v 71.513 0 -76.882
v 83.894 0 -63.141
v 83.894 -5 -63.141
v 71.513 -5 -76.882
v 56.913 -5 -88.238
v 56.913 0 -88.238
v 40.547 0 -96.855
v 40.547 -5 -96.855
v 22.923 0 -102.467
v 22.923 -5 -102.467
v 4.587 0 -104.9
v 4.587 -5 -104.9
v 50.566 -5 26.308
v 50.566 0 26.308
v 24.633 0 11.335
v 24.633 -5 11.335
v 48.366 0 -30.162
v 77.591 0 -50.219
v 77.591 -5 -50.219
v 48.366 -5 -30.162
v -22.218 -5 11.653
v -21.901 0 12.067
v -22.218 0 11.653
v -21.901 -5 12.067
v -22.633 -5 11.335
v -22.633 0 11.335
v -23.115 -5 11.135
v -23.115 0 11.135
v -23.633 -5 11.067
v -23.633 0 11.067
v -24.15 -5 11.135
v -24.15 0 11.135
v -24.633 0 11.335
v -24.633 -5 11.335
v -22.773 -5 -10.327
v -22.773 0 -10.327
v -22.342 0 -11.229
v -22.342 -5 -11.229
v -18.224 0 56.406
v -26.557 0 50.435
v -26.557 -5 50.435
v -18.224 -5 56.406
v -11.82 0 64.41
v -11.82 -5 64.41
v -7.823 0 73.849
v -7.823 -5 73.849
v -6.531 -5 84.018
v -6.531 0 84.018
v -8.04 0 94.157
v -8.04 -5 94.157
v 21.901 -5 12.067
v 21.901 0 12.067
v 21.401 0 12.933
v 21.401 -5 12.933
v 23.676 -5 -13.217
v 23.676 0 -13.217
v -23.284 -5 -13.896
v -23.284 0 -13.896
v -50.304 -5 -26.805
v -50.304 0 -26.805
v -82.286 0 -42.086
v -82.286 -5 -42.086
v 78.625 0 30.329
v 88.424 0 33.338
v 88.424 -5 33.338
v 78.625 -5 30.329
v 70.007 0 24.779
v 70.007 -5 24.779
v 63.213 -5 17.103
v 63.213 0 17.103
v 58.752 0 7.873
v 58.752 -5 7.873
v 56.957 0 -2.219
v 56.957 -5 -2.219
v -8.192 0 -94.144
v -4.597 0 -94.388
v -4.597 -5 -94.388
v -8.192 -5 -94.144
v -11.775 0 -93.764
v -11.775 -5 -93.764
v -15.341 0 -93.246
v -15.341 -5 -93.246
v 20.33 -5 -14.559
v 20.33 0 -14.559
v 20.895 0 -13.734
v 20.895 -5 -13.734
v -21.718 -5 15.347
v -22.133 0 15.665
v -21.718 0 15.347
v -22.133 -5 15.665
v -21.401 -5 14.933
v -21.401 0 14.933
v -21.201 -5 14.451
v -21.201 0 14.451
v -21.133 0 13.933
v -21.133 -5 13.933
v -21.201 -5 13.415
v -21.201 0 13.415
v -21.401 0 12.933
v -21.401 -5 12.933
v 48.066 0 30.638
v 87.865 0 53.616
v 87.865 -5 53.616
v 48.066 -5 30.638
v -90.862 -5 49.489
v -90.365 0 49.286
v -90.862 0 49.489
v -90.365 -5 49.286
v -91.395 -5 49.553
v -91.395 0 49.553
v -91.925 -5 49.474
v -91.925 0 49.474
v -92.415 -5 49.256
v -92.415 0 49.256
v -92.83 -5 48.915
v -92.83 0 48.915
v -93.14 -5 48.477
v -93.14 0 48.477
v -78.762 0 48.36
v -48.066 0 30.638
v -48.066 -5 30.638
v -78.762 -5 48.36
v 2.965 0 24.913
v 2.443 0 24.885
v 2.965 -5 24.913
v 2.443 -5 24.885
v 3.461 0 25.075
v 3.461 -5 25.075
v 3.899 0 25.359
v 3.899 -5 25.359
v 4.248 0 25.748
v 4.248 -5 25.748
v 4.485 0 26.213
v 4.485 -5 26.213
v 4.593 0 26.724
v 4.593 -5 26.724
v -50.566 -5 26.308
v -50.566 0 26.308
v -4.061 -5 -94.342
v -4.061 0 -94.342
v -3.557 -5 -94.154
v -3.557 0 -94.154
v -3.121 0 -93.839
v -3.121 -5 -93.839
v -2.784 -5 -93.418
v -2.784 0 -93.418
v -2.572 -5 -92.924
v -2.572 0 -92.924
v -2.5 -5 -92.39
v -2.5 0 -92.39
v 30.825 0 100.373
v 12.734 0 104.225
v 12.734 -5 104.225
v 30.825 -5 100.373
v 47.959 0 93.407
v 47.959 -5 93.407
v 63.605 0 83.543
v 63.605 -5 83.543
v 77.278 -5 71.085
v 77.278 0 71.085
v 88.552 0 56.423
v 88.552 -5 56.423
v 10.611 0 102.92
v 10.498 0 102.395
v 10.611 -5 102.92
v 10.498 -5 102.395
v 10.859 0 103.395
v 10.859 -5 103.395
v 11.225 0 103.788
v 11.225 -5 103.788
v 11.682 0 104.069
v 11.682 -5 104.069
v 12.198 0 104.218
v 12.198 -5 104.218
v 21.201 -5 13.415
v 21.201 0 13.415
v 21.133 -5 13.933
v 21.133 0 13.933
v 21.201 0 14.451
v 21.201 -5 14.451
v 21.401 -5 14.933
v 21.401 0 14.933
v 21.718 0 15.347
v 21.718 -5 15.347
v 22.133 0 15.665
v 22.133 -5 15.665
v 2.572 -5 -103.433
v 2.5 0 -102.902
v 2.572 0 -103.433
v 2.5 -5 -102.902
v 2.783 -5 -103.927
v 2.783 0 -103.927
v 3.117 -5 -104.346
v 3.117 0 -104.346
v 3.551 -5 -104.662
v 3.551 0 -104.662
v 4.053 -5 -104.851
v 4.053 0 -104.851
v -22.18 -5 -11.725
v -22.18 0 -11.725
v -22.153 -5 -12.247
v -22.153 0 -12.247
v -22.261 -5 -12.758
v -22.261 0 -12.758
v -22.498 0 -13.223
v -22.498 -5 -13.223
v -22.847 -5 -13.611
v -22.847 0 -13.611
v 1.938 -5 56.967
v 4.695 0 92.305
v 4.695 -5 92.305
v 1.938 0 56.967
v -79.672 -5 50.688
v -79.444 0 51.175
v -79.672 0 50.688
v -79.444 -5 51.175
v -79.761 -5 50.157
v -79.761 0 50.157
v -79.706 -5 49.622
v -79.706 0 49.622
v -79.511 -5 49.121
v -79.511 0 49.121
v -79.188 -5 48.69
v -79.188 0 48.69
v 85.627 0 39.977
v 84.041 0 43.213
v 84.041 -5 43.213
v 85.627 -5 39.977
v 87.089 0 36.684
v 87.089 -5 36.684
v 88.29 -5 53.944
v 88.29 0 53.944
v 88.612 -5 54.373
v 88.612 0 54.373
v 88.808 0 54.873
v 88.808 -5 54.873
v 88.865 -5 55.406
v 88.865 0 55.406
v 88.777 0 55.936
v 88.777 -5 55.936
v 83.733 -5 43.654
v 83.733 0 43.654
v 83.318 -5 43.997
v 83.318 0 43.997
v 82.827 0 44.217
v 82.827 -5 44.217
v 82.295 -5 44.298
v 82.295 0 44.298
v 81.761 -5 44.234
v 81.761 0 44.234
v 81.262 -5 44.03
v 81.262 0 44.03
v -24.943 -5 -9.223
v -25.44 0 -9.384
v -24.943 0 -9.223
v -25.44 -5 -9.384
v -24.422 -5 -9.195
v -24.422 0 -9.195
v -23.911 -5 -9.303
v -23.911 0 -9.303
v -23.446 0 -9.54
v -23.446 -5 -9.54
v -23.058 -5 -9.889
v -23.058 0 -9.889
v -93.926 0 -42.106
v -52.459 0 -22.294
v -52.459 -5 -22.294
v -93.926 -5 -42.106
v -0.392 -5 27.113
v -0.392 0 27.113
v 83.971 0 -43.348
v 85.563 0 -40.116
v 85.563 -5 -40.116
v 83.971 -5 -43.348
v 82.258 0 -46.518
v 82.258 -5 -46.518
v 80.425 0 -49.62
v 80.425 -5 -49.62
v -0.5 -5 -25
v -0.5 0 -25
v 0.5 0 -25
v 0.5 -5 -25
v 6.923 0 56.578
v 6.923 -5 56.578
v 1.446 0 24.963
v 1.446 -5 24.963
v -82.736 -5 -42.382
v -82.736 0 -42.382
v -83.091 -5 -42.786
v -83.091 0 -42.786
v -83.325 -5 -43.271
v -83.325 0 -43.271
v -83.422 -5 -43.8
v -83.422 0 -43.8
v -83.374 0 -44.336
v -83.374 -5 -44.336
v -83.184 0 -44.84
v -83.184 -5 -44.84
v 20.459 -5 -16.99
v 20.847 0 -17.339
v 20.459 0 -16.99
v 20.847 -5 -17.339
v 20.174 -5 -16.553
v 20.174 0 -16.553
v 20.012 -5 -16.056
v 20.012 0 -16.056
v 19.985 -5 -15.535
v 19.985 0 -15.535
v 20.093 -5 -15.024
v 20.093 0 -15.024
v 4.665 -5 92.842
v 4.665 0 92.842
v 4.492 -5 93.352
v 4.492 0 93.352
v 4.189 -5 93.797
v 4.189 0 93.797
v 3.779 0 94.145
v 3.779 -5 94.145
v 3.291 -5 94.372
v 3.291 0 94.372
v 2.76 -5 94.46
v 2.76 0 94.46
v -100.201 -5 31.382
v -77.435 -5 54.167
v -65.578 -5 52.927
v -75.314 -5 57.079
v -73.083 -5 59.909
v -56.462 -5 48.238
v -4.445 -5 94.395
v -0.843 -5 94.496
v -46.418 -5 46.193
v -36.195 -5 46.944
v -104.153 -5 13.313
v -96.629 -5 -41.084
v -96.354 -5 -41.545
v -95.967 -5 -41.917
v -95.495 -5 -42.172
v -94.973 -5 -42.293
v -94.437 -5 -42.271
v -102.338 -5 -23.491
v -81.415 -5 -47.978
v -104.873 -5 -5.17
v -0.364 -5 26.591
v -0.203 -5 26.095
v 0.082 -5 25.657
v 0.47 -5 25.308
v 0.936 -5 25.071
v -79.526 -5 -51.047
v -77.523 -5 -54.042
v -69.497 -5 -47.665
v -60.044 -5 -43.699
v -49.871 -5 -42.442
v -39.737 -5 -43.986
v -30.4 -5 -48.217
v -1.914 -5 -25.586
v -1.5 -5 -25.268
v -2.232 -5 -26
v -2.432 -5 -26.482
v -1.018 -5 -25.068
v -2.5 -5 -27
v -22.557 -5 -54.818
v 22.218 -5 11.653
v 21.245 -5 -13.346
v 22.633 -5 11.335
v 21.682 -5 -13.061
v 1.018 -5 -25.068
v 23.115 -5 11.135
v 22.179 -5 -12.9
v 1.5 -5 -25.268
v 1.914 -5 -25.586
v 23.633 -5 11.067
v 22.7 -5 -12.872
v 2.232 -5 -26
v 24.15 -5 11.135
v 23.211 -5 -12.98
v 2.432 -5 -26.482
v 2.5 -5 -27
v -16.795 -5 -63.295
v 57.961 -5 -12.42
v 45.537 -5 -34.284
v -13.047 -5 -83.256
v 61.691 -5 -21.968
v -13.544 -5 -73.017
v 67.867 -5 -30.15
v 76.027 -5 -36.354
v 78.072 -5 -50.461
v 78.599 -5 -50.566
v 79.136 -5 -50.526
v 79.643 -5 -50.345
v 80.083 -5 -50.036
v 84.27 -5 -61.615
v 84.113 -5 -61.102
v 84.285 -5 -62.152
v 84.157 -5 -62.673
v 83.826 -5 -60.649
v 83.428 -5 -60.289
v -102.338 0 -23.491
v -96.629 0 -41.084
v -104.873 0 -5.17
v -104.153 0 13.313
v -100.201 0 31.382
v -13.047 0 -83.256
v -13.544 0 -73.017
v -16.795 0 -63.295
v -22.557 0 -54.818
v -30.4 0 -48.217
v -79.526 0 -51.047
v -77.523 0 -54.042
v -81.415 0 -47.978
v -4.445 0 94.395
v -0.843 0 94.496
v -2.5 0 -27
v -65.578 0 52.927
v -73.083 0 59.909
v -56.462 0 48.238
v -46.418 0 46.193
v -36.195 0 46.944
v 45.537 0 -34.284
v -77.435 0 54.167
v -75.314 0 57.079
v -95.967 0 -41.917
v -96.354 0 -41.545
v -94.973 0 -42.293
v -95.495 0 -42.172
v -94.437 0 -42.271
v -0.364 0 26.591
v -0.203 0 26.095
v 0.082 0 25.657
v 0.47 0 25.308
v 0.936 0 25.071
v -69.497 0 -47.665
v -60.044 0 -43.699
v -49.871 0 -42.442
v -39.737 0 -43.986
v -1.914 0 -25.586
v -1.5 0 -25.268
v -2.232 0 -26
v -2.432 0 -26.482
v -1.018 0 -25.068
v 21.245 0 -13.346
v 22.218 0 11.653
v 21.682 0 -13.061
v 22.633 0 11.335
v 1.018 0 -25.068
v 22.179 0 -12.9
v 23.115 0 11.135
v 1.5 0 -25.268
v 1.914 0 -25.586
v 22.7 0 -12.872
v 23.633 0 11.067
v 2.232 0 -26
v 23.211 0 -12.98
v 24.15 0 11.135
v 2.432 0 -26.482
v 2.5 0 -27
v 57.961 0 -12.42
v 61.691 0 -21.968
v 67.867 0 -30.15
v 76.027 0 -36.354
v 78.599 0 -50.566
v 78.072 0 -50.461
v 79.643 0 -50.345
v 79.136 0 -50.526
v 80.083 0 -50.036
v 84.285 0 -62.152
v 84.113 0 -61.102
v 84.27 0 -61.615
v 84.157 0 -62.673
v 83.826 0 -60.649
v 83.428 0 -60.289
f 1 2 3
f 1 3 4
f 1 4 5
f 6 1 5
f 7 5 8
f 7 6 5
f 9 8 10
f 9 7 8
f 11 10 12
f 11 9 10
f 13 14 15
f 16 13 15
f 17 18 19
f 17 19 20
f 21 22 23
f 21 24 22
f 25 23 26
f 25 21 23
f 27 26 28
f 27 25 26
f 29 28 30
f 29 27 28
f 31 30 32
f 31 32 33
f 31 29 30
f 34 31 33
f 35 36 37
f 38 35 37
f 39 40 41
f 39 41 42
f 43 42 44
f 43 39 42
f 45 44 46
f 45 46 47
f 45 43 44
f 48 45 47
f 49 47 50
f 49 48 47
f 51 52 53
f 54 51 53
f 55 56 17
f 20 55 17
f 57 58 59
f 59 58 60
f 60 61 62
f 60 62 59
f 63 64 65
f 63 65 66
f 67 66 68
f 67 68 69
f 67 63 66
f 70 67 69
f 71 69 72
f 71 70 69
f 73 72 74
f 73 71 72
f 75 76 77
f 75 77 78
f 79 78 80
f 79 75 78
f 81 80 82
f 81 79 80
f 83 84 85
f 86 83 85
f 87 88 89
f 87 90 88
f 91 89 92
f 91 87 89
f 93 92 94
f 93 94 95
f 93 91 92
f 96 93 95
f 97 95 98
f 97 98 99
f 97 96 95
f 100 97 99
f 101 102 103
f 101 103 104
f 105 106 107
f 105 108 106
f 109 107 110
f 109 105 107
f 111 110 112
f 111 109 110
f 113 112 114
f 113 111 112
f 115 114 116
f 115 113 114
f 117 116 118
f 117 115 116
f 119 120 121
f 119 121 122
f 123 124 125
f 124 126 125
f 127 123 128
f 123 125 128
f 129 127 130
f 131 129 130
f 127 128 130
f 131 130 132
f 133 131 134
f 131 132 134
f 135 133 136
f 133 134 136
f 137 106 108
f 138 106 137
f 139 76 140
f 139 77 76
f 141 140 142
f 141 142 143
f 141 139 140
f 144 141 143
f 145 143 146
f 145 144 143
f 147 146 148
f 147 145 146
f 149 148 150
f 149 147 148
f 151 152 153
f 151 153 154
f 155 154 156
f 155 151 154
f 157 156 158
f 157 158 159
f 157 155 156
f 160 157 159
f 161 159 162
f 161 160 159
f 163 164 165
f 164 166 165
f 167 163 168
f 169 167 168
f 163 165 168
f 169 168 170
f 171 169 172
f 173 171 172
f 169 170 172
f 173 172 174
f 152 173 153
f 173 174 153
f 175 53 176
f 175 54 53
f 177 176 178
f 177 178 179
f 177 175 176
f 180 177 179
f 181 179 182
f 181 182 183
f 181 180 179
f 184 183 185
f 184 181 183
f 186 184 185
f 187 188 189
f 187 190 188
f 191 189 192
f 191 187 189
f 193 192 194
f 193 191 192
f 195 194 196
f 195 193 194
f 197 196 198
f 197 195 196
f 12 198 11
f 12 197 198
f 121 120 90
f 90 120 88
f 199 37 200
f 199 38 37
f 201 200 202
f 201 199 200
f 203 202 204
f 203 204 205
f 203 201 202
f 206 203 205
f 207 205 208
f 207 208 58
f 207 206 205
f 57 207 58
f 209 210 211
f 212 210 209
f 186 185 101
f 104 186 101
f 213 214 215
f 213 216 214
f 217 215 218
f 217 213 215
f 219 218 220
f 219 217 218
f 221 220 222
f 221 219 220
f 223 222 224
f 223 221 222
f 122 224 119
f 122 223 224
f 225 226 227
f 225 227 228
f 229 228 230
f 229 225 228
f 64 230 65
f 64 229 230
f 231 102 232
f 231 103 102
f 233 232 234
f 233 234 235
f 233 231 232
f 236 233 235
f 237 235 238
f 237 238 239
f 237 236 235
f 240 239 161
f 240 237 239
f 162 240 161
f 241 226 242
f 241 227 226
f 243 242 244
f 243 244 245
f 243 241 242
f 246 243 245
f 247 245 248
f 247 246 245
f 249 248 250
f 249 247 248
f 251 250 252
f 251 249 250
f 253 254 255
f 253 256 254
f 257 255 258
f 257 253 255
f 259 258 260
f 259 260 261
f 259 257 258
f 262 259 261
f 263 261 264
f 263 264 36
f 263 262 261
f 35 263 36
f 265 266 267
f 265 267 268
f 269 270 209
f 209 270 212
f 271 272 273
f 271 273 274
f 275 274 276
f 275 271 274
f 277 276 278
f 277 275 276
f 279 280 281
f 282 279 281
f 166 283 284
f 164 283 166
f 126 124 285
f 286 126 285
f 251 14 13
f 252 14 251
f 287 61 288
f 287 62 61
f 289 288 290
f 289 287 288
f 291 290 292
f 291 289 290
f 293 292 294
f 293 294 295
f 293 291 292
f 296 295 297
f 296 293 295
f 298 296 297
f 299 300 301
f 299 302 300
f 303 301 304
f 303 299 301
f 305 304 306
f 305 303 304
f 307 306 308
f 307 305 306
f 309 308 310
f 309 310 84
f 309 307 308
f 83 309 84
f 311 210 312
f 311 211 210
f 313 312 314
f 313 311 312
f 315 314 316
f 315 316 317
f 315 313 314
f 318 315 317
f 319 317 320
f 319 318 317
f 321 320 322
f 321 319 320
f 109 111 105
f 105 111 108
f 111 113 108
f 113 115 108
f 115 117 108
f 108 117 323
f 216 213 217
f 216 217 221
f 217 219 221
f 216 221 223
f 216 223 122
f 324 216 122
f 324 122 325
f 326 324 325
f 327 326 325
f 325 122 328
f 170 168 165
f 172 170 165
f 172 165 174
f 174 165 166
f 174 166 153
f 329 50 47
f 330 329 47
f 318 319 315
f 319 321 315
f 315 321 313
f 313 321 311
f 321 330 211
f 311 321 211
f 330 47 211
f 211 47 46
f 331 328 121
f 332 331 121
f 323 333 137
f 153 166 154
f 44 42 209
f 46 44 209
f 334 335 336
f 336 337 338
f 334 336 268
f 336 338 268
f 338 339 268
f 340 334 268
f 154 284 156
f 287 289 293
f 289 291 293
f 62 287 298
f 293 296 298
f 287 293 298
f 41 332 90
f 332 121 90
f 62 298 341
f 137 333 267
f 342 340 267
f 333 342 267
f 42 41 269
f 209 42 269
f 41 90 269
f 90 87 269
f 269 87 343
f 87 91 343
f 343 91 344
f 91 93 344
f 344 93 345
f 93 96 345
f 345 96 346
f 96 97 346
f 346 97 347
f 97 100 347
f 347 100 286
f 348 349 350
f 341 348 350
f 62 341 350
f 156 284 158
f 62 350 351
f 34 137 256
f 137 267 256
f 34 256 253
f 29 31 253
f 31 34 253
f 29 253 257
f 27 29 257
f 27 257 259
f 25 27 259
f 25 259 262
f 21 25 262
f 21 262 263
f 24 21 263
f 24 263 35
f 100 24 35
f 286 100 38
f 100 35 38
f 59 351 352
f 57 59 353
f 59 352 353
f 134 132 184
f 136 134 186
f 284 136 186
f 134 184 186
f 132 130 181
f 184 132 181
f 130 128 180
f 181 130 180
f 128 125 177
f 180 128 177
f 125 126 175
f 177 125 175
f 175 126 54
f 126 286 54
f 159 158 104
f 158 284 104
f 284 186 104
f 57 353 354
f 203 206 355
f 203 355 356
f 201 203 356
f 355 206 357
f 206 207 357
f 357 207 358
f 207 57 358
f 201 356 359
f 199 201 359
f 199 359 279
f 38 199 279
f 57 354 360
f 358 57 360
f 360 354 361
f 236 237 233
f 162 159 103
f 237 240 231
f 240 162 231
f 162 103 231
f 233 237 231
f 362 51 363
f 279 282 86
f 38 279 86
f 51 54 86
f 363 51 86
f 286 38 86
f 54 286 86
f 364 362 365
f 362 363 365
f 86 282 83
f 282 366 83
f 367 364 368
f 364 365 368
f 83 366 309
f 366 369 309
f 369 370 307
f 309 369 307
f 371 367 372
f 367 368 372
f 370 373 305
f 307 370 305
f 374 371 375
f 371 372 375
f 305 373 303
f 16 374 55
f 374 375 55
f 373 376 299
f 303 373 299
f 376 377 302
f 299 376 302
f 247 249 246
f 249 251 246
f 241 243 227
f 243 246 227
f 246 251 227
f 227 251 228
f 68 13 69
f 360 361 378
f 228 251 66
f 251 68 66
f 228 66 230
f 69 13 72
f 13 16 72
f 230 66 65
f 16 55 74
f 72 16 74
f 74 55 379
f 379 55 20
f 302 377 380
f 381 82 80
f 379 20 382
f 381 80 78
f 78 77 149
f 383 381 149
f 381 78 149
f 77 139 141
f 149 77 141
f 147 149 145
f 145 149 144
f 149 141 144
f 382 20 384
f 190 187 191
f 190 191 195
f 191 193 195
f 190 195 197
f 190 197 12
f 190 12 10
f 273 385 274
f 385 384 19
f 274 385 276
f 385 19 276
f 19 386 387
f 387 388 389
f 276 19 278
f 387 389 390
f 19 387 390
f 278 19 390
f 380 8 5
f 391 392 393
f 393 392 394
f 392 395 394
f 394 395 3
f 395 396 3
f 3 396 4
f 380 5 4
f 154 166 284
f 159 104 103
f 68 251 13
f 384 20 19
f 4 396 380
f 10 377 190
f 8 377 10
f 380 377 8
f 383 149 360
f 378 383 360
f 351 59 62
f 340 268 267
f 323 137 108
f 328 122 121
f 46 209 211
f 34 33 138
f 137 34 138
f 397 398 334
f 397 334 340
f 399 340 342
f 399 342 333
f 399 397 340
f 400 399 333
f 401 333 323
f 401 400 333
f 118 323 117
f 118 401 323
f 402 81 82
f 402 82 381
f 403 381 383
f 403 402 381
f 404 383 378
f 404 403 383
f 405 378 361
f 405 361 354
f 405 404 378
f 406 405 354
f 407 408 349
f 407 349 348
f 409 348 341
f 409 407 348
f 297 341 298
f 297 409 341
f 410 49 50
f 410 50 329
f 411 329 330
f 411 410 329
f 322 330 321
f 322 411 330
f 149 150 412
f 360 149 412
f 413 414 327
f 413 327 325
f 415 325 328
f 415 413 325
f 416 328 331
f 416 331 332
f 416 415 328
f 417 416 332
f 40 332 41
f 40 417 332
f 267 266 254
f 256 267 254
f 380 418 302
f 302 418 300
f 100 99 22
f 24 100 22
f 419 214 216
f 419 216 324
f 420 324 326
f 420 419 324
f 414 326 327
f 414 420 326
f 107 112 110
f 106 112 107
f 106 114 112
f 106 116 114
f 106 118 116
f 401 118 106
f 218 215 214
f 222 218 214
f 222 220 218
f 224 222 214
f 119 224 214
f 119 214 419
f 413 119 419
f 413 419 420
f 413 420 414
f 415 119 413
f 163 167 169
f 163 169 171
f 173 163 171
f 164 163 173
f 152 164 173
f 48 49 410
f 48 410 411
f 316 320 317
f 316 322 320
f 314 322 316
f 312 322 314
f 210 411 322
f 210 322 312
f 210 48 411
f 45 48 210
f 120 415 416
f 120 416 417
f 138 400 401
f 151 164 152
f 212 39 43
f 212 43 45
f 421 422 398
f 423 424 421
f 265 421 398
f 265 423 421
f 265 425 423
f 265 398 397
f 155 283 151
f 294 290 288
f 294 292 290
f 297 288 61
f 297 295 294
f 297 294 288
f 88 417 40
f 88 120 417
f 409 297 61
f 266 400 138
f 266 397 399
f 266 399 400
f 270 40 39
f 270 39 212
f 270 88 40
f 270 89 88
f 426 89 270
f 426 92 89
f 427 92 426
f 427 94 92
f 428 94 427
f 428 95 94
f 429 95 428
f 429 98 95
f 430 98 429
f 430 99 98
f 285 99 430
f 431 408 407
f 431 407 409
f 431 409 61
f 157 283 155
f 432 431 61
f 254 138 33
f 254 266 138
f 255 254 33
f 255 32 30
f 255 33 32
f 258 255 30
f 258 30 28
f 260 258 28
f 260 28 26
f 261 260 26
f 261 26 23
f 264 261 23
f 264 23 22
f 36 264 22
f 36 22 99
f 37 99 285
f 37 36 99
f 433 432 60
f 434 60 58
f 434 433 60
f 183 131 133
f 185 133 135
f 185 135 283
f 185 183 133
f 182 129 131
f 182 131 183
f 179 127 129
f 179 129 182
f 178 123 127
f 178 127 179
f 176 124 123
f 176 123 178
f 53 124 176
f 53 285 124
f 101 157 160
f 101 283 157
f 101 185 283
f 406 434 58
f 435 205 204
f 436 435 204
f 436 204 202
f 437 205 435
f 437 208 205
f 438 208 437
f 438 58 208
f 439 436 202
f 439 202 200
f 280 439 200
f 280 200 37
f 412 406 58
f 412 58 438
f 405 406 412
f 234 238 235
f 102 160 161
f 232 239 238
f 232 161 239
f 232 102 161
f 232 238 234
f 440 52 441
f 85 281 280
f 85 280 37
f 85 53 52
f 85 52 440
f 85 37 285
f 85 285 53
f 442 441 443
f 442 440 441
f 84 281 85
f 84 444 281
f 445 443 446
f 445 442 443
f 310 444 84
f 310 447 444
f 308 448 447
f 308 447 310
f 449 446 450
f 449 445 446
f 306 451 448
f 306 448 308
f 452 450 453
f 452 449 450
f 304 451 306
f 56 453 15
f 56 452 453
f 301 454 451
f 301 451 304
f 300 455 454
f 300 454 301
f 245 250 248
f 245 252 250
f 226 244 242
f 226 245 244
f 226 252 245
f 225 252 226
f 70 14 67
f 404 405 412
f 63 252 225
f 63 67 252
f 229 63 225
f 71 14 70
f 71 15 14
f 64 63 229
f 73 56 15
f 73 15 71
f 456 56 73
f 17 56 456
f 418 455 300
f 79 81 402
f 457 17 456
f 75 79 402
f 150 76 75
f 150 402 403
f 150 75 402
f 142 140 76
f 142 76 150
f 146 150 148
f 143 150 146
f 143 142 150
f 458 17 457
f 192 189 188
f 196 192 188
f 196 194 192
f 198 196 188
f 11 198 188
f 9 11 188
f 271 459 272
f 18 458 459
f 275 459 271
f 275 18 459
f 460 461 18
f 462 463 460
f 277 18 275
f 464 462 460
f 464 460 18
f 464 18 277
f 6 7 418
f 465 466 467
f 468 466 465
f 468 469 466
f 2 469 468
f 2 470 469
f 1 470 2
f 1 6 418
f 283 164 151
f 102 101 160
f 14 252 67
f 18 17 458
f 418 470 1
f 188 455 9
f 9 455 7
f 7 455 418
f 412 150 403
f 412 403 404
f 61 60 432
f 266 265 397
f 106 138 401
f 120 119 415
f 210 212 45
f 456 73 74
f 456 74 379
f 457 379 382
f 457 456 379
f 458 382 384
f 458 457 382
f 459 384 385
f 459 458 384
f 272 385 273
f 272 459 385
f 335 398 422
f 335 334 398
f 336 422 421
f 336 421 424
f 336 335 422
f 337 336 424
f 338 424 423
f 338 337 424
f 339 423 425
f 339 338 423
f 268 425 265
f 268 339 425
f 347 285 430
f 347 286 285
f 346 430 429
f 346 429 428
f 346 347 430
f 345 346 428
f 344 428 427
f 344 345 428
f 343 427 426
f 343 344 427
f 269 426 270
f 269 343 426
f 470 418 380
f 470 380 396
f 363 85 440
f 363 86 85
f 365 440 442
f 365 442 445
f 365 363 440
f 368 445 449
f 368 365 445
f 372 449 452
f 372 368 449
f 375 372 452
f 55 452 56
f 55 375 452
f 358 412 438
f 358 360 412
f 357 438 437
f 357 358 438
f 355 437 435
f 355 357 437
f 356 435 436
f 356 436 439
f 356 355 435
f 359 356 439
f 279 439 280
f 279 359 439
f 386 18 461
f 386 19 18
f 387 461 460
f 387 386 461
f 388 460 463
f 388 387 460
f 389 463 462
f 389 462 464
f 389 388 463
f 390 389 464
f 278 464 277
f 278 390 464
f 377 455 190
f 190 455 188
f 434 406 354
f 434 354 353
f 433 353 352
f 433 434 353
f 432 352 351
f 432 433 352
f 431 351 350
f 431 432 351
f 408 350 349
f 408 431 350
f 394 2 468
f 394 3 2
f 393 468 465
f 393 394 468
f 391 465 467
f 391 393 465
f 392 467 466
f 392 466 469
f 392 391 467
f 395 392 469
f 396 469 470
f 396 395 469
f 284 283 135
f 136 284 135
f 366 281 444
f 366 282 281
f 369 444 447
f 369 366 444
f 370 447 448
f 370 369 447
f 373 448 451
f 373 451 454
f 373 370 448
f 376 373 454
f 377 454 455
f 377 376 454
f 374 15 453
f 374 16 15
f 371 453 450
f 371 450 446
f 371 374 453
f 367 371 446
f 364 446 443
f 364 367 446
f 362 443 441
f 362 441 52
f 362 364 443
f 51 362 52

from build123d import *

# Parameters (mm, degrees)
EXTRUDE_1_DEPTH = 5
EXTRUDE_2_DEPTH = 5
FILLET_1_R      = 2


with BuildPart() as part:
    # 草圖1 → 填料-伸長1 (new body)
    with BuildSketch(Plane(origin=(0, 0, 0), x_dir=(1, 0, 0), z_dir=(0, 1, 0))):
        with BuildLine():
            Line((50.565945697, -26.307511014), (22.900635095, -10.334936491))
            Line((22.900635095, -10.334936491), (20.400635095, -14.665063509))
            Line((20.400635095, -14.665063509), (48.065945697, -30.637638033))
            ThreePointArc((48.065945697, -30.637638033), (30.4, -48.216594654), (6.922542226, -56.578073572))
            Line((6.922542226, -56.578073572), (4.437329437, -24.729741355))
            Line((4.437329437, -24.729741355), (-0.547516958, -25.118722602))
            Line((-0.547516958, -25.118722602), (1.93769583, -56.96705482))
            ThreePointArc((1.93769583, -56.96705482), (-26.556795854, -50.435469602), (-48.065945697, -30.637638033))
            Line((-48.065945697, -30.637638033), (-20.400635095, -14.665063509))
            Line((-20.400635095, -14.665063509), (-22.900635095, -10.334936491))
            Line((-22.900635095, -10.334936491), (-50.565945697, -26.307511014))
            ThreePointArc((-50.565945697, -26.307511014), (-56.956795854, -2.218874948), (-52.459320124, 22.29393936))
            Line((-52.459320124, 22.29393936), (-23.635248961, 8.522030659))
            Line((-23.635248961, 8.522030659), (-21.479693405, 13.033524896))
            Line((-21.479693405, 13.033524896), (-50.303764568, 26.805433596))
            ThreePointArc((-50.303764568, 26.805433596), (-30.4, 48.216594654), (-2.5, 56.945149047))
            Line((-2.5, 56.945149047), (-2.5, 25))
            Line((-2.5, 25), (2.5, 25))
            Line((2.5, 25), (2.5, 56.945149047))
            ThreePointArc((2.5, 56.945149047), (26.556795854, 50.435469602), (45.536777898, 34.284134212))
            Line((45.536777898, 34.284134212), (19.197919523, 16.207710695))
            Line((19.197919523, 16.207710695), (22.027210363, 12.085197706))
            Line((22.027210363, 12.085197706), (48.366068738, 30.161621224))
            ThreePointArc((48.366068738, 30.161621224), (56.956795854, 2.218874948), (50.565945697, -26.307511014))
        make_face()
    extrude(amount=-EXTRUDE_1_DEPTH)

    # 草圖4 → 填料-伸長2 (add)
    with BuildSketch(Plane(origin=(0, 0, 0), x_dir=(1, 0, 0), z_dir=(0, 1, 0))):
        with BuildLine():
            ThreePointArc((48.065945697, -30.637638033), (30.4, -48.216594654), (6.922542226, -56.578073572))
            Line((6.922542226, -56.578073572), (10.658713711, -104.457607775))
            ThreePointArc((10.658713711, -104.457607775), (56, -88.820042783), (89.656889178, -54.650180448))
            Line((89.656889178, -54.650180448), (48.065945697, -30.637638033))
        make_face()
        with BuildLine():
            Line((4.85674931, -94.375113172), (1.93769583, -56.96705482))
            ThreePointArc((1.93769583, -56.96705482), (-12.735400783, -55.559063769), (-26.556796584, -50.435469218))
            ThreePointArc((-26.556796584, -50.435469218), (-9.497439871, -68.99258523), (-8.040249963, -94.157338432))
            ThreePointArc((-8.040249963, -94.157338432), (-1.595470326, -94.486530651), (4.85674931, -94.375113172))
        make_face()
        with BuildLine():
            ThreePointArc((56.956795794, 2.218876491), (55.621252058, -12.460991916), (50.565945697, -26.307511014))
            Line((50.565945697, -26.307511014), (83.060757239, -45.068399205))
            ThreePointArc((83.060757239, -45.068399205), (85.942912679, -39.294602178), (88.424299029, -33.337566517))
            ThreePointArc((88.424299029, -33.337566517), (66.346381744, -21.173940759), (56.956795794, 2.218876491))
        make_face()
        with BuildLine():
            ThreePointArc((-73.083329018, -59.908906012), (-51.510362628, -46.870681896), (-26.556796584, -50.435469218))
            ThreePointArc((-26.556796584, -50.435469218), (-38.602162456, -41.938920512), (-48.065945697, -30.637638033))
            Line((-48.065945697, -30.637638033), (-80.560757239, -49.398526224))
            ThreePointArc((-80.560757239, -49.398526224), (-77.001580057, -54.781444566), (-73.083329018, -59.908906012))
        make_face()
        with BuildLine():
            ThreePointArc((48.366068738, 30.161621224), (54.483260678, 16.750352411), (56.956795794, 2.218876491))
            ThreePointArc((56.956795794, 2.218876491), (64.498052131, 26.271269361), (85.562772016, 40.115608495))
            ThreePointArc((85.562772016, 40.115608495), (82.625471022, 45.861547492), (79.302870836, 51.393624868))
            Line((79.302870836, 51.393624868), (48.366068738, 30.161621224))
        make_face()
        with BuildLine():
            Line((-92.156889178, -50.320053429), (-50.565945697, -26.307511014))
            ThreePointArc((-50.565945697, -26.307511014), (-56.956795854, -2.218874948), (-52.459320124, 22.29393936))
            Line((-52.459320124, 22.29393936), (-95.792298807, 42.998087042))
            ThreePointArc((-95.792298807, 42.998087042), (-104.920413415, -4.08740122), (-92.156889178, -50.320053429))
        make_face()
        with BuildLine():
            ThreePointArc((2.5, 56.945149047), (26.556795854, 50.435469602), (45.536777898, 34.284134212))
            Line((45.536777898, 34.284134212), (85.133585096, 61.459520733))
            ThreePointArc((85.133585096, 61.459520733), (48.920413415, 92.907444004), (2.5, 104.970233876))
            Line((2.5, 104.970233876), (2.5, 56.945149047))
        make_face()
        with BuildLine():
            Line((-84.159620147, 42.981488303), (-50.303764568, 26.805433596))
            ThreePointArc((-50.303764568, 26.805433596), (-41.747859976, 38.808712777), (-30.399998639, 48.216595512))
            ThreePointArc((-30.399998639, 48.216595512), (-55.000611157, 42.721316766), (-77.522522053, 54.041729936))
            ThreePointArc((-77.522522053, 54.041729936), (-81.030000696, 48.624983159), (-84.159620147, 42.981488303))
        make_face()
        with BuildLine():
            ThreePointArc((-30.399998639, 48.216595512), (-17.019088969, 54.399913701), (-2.5, 56.945149047))
            Line((-2.5, 56.945149047), (-2.5, 94.466925429))
            ThreePointArc((-2.5, 94.466925429), (-8.941332621, 94.076046744), (-15.34097001, 93.246472529))
            ThreePointArc((-15.34097001, 93.246472529), (-14.836019776, 68.044623914), (-30.399998639, 48.216595512))
        make_face()
    extrude(amount=-EXTRUDE_2_DEPTH)

    # 圓角1
    fillet_1_edges = [part.edges().sort_by_distance(p)[0] for p in [
        (-80.560757239, -2.5, 49.398526224),
        (4.85674931, -2.5, 94.375113172),
        (-84.159620147, -2.5, -42.981488303),
        (-2.5, -2.5, -94.466925429),
        (79.302870836, -2.5, -51.393624868),
        (83.060757239, -2.5, 45.068399205),
        (4.437329437, -2.5, 24.729741355),
        (-0.547516958, -2.5, 25.118722602),
        (-20.400635095, -2.5, 14.665063509),
        (-22.900635095, -2.5, 10.334936491),
        (-23.635248961, -2.5, -8.522030659),
        (-21.479693405, -2.5, -13.033524896),
        (-2.5, -2.5, -25),
        (2.5, -2.5, -25),
        (19.197919523, -2.5, -16.207710695),
        (22.027210363, -2.5, -12.085197706),
        (22.900635095, -2.5, 10.334936491),
        (20.400635095, -2.5, 14.665063509),
        (-95.792298807, -2.5, -42.998087042),
        (-92.156889178, -2.5, 50.320053429),
        (10.658713711, -2.5, 104.457607775),
        (89.656889178, -2.5, 54.650180448),
        (85.133585096, -2.5, -61.459520733),
        (2.5, -2.5, -104.970233876),
    ]]
    fillet(fillet_1_edges, radius=FILLET_1_R)


solid = part.part
